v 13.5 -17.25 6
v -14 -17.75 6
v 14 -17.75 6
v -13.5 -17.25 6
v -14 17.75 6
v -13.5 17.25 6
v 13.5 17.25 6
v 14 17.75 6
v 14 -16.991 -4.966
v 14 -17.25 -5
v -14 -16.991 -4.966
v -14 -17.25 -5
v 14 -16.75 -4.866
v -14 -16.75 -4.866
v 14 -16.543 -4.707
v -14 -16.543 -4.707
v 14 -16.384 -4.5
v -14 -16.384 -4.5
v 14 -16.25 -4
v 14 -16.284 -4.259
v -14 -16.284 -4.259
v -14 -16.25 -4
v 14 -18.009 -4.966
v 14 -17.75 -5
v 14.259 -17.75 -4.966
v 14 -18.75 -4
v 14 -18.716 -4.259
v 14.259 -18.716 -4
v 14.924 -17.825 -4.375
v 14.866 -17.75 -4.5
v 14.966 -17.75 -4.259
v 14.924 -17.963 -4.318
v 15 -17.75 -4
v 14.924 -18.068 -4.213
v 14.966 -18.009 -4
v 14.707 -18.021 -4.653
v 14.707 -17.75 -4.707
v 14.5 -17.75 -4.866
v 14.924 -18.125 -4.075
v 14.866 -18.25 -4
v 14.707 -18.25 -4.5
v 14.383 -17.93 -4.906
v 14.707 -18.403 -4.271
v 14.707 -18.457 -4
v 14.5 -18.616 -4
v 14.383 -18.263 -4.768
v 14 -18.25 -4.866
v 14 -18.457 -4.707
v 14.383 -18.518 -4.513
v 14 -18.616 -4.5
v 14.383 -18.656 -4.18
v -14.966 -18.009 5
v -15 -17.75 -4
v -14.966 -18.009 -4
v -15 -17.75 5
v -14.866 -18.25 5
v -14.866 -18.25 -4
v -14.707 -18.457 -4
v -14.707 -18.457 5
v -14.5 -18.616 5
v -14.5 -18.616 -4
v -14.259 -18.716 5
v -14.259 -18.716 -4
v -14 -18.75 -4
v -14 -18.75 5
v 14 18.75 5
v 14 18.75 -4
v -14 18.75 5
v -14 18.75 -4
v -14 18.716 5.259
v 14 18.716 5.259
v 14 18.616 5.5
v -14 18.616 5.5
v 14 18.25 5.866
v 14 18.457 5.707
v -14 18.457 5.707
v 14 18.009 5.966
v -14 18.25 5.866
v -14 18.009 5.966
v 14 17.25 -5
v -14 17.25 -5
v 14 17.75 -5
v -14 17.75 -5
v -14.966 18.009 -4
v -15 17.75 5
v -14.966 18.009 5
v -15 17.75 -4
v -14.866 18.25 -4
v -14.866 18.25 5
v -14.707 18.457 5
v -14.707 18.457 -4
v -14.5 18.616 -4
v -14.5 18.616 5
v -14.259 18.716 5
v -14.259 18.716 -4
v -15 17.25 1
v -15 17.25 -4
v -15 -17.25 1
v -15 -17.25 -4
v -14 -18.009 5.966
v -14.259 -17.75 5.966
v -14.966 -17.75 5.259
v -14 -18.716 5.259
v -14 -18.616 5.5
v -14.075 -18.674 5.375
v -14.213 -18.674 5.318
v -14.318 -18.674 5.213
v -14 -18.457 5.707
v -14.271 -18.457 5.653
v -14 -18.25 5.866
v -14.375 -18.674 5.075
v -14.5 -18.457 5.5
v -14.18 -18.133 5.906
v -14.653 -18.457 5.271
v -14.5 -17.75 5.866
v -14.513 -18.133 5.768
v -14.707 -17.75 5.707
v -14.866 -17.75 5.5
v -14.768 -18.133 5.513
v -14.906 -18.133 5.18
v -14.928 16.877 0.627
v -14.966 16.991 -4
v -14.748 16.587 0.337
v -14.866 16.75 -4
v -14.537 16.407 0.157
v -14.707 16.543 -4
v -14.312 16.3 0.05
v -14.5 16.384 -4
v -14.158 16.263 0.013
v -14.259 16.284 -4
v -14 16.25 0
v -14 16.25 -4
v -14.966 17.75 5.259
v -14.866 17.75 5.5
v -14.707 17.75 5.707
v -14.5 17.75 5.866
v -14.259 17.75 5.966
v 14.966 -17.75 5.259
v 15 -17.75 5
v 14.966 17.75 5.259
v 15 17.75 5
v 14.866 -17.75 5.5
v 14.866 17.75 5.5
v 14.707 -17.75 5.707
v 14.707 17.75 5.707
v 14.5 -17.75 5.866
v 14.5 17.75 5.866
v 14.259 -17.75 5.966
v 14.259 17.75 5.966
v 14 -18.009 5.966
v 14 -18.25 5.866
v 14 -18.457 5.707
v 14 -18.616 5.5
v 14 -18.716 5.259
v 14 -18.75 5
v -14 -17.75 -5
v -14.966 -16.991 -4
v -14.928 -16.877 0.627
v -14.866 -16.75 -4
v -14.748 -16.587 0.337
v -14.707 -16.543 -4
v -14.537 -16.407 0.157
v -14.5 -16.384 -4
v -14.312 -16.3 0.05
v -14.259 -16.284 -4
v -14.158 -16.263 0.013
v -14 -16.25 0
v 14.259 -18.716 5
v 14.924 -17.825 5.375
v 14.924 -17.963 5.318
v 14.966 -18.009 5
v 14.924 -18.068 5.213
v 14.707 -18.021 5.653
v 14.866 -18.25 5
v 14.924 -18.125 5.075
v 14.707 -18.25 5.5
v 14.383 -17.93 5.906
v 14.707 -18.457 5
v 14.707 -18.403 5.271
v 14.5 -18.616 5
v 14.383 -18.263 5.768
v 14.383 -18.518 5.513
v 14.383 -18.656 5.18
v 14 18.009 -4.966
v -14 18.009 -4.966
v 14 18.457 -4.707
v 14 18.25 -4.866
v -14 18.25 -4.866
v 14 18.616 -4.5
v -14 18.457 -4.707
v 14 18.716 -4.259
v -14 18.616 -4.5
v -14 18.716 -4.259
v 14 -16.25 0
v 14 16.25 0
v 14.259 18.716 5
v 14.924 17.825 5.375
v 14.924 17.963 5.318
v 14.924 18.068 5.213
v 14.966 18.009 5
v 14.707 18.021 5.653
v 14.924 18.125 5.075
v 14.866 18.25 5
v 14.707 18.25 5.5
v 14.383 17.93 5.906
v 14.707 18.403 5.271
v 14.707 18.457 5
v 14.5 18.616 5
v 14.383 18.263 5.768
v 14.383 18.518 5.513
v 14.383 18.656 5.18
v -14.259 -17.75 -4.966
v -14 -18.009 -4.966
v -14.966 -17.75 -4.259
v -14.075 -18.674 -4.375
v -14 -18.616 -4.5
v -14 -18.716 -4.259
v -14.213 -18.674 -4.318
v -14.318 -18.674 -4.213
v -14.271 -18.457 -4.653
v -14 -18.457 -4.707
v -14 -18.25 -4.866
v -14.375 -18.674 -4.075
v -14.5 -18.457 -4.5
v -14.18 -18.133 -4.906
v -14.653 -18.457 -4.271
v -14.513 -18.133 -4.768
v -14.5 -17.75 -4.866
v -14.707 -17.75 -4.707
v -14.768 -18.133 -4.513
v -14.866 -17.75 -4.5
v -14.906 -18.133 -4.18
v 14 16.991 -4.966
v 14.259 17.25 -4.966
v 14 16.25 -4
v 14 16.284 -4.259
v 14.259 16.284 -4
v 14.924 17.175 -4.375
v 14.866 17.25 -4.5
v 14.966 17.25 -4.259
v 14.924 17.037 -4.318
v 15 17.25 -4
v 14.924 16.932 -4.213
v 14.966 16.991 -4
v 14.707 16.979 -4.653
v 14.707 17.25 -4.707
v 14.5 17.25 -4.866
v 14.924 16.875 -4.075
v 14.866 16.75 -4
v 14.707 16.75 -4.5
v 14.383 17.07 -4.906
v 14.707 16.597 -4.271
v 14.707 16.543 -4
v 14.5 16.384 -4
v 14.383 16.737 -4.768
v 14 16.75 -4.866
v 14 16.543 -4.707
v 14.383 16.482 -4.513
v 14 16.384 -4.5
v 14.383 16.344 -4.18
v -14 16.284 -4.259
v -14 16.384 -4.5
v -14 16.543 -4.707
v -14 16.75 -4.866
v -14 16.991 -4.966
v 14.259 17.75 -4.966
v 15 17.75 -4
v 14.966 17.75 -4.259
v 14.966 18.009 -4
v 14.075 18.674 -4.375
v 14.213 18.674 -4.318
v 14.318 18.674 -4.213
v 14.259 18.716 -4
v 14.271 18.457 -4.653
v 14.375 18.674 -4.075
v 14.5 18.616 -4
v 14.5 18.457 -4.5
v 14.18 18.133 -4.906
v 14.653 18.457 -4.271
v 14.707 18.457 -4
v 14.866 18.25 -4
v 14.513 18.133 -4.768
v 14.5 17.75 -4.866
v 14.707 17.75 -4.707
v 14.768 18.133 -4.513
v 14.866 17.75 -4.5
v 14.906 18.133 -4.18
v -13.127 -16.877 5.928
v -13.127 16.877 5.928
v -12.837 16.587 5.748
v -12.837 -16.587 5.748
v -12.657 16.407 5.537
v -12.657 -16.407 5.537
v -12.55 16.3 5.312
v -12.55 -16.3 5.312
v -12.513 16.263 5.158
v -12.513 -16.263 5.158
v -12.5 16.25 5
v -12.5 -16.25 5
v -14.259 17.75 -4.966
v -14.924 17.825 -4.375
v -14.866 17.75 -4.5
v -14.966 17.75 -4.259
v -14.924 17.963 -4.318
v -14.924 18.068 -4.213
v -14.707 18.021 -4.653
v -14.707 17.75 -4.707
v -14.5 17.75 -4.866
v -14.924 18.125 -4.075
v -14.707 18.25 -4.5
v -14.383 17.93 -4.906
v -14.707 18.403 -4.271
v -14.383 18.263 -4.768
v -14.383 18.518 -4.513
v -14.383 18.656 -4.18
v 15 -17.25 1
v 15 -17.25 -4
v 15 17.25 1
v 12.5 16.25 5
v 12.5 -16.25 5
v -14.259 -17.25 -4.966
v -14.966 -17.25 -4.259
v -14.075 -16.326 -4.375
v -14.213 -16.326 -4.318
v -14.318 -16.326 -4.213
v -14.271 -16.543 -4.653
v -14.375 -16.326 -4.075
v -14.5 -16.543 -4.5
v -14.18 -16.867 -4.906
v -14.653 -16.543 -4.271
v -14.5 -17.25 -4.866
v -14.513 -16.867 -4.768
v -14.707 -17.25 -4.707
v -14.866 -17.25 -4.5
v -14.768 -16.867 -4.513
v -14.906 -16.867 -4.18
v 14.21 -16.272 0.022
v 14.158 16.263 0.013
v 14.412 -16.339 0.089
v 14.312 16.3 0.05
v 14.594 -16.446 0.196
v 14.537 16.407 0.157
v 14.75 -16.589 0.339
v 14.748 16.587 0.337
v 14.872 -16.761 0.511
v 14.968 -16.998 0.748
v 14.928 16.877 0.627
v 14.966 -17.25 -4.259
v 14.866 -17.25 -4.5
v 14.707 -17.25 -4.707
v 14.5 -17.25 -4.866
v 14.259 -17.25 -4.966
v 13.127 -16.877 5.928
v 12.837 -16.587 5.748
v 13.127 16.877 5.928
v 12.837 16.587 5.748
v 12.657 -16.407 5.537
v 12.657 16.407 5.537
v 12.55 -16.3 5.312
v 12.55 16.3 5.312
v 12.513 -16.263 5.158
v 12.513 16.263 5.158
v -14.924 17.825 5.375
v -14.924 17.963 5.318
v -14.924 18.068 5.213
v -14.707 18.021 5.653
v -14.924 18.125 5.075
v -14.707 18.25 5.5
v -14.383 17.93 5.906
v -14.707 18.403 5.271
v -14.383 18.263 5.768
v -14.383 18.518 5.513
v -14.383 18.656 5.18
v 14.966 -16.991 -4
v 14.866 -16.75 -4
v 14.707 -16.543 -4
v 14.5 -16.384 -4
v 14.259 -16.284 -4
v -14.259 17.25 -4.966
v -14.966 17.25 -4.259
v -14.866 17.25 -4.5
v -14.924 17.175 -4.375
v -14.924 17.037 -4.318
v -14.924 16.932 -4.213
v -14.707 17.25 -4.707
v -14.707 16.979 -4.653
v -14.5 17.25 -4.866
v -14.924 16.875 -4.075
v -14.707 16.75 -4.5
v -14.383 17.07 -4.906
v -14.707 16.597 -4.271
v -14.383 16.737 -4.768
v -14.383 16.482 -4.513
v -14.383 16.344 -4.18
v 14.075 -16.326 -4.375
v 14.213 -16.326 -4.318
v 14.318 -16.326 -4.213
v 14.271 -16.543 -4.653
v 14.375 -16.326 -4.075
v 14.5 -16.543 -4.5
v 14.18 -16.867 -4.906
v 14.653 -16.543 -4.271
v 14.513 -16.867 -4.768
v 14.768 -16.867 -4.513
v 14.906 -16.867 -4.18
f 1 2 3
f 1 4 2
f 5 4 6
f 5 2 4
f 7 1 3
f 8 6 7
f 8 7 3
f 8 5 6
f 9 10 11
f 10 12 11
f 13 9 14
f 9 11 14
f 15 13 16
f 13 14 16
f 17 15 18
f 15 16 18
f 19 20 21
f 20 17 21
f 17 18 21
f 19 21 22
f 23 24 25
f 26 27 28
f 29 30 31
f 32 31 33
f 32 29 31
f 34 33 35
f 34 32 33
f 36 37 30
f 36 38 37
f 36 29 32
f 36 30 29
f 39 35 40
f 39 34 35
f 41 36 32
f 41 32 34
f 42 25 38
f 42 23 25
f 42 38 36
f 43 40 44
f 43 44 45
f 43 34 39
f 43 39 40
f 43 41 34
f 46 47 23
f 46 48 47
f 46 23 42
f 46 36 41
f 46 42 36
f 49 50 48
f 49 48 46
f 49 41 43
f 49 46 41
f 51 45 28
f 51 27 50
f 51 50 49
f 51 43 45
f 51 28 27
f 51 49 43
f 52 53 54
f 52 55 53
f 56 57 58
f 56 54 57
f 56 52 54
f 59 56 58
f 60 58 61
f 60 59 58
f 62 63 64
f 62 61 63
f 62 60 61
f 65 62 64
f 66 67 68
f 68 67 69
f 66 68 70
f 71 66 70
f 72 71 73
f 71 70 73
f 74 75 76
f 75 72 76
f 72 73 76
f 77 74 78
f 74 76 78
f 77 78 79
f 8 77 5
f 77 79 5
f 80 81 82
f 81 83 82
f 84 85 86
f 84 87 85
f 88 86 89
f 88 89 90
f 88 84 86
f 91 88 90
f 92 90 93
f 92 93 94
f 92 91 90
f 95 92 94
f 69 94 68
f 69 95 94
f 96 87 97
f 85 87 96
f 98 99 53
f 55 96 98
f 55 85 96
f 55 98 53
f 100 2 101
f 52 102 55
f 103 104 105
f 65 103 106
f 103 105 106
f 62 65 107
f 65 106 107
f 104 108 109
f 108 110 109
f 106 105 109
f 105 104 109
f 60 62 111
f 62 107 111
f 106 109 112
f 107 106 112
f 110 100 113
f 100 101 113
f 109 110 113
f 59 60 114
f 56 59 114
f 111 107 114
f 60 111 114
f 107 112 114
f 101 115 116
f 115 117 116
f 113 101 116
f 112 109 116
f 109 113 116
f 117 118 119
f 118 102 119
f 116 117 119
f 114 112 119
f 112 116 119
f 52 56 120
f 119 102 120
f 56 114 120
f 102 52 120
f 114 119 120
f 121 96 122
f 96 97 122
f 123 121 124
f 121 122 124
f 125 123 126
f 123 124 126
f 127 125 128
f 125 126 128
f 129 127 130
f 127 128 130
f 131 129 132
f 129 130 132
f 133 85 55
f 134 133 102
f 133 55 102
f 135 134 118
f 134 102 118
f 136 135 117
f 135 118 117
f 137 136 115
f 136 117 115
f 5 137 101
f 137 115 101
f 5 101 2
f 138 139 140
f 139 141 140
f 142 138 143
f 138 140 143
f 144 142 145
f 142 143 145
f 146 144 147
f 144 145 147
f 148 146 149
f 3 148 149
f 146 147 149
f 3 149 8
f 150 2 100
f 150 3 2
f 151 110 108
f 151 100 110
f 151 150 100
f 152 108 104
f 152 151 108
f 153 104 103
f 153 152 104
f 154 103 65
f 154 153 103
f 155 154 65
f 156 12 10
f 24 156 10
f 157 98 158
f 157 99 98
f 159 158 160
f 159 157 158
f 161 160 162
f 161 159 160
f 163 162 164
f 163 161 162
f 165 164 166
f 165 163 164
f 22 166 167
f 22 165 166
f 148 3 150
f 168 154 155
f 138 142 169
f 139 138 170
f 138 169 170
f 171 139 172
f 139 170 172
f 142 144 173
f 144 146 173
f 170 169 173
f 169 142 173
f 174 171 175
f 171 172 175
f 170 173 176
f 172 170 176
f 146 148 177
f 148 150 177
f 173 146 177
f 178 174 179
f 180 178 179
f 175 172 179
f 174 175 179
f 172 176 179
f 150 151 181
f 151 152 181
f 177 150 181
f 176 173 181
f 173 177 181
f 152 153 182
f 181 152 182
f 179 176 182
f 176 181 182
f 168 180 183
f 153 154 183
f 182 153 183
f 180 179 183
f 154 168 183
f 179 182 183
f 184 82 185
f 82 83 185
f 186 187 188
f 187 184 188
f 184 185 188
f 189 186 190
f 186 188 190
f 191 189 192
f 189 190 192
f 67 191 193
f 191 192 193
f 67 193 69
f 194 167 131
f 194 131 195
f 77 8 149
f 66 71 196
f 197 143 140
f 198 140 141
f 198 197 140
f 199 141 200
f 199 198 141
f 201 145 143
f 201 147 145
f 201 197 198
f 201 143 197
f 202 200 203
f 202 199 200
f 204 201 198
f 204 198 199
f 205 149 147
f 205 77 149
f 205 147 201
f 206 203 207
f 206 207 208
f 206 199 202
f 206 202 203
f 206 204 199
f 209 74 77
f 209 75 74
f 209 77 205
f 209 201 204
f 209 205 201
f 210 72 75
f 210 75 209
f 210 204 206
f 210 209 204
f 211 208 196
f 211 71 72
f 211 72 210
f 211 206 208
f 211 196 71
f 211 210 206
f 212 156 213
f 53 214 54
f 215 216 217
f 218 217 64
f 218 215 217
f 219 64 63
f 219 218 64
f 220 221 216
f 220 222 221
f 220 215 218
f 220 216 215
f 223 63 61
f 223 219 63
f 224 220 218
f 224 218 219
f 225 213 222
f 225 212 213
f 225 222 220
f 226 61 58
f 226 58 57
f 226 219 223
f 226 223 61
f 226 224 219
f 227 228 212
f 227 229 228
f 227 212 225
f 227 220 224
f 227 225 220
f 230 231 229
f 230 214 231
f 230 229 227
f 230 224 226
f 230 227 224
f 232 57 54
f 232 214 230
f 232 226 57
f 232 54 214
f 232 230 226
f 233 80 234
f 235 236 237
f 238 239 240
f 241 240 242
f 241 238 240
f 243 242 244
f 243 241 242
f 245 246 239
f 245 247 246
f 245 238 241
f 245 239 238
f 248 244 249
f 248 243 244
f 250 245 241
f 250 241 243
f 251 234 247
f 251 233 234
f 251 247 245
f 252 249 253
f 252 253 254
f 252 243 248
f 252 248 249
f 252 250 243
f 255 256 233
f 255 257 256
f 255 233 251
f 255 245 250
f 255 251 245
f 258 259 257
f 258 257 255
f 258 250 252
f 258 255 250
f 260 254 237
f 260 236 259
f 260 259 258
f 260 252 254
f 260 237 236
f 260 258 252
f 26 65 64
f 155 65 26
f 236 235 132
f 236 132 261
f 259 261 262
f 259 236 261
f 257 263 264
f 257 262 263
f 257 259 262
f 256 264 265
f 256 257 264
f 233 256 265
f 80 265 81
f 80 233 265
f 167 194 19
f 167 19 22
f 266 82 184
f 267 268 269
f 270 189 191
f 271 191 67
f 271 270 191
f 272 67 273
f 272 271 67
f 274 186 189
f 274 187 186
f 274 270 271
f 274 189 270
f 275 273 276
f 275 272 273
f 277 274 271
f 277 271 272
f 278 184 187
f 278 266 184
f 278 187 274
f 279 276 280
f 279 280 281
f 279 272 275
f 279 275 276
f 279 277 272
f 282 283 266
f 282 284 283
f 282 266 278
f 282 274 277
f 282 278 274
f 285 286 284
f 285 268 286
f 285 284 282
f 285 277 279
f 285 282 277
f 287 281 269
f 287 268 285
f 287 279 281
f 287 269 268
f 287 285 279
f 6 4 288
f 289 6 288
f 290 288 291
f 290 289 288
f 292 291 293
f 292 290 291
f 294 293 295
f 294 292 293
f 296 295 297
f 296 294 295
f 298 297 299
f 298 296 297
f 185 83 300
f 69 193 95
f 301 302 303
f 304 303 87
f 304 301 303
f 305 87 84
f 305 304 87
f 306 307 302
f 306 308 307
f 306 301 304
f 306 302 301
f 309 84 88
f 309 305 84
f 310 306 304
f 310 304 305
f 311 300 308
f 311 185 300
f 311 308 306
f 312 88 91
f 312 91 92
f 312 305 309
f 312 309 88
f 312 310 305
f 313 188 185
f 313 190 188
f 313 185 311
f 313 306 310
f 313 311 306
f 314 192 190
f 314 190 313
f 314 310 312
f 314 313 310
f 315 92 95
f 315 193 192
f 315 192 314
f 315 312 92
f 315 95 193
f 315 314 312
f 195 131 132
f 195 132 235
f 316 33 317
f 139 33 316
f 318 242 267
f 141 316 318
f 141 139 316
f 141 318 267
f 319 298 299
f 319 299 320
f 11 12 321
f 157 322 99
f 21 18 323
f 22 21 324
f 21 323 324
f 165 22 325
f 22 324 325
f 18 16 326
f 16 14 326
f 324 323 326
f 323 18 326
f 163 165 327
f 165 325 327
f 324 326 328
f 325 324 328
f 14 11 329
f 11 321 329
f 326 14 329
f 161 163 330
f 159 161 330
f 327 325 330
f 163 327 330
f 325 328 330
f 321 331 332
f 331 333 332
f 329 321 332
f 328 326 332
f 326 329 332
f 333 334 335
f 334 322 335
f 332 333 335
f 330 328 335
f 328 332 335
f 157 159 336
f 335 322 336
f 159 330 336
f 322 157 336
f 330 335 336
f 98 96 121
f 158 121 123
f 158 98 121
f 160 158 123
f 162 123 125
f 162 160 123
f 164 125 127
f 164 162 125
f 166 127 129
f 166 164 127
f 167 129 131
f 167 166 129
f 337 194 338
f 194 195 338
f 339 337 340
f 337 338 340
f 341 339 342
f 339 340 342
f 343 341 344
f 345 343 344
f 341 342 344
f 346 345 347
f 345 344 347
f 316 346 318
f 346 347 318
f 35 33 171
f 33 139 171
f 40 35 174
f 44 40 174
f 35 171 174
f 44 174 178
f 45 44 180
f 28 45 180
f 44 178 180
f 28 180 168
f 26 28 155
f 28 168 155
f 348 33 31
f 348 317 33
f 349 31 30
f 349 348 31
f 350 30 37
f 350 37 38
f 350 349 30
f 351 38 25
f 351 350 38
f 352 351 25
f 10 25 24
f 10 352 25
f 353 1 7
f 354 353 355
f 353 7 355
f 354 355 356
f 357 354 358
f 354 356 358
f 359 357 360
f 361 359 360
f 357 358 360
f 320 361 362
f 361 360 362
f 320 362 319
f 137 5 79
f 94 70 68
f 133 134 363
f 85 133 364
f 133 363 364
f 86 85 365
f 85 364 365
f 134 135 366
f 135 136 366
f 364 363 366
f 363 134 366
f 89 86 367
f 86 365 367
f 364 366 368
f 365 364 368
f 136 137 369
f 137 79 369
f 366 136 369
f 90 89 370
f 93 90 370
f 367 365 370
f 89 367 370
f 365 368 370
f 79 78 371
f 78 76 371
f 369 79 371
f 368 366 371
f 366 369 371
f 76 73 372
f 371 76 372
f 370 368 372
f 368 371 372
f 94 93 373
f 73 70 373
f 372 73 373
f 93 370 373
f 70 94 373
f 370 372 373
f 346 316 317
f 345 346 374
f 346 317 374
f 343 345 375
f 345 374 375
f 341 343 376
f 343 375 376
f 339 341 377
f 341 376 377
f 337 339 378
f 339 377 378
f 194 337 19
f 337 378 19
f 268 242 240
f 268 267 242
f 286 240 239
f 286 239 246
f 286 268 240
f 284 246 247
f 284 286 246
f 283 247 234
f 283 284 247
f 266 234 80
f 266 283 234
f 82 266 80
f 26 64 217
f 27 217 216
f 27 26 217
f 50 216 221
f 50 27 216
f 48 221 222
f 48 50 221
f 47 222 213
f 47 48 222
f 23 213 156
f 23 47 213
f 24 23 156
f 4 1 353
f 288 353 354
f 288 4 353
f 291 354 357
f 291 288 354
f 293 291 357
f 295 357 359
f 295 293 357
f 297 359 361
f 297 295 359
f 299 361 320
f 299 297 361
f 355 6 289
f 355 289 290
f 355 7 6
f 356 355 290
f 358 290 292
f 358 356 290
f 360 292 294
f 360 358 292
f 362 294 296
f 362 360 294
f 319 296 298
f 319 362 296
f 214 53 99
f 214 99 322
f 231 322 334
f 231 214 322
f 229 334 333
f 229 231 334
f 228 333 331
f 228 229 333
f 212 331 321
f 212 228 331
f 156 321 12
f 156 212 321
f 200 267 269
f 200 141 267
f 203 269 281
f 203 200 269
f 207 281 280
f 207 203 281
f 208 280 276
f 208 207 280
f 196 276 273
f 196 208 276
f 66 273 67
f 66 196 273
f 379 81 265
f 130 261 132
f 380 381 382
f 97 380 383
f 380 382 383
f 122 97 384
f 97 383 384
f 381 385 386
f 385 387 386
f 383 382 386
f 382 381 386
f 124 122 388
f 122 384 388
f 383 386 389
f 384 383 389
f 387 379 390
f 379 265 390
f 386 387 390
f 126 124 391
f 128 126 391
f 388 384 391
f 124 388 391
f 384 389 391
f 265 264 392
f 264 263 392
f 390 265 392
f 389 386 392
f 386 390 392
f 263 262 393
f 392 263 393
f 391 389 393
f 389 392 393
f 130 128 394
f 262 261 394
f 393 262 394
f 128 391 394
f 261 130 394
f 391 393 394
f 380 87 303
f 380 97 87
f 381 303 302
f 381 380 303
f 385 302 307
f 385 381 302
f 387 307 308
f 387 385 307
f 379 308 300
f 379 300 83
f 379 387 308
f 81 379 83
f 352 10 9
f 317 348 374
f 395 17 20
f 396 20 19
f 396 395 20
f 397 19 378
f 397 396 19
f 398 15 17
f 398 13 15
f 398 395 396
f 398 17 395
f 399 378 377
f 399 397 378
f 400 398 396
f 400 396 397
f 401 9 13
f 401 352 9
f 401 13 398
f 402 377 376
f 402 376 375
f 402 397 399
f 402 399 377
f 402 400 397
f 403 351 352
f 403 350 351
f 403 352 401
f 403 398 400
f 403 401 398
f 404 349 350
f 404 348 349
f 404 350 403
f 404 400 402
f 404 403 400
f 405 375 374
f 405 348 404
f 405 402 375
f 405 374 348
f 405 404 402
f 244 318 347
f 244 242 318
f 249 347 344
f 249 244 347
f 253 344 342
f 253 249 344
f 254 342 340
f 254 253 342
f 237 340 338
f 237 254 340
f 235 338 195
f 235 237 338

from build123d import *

# Parameters (mm, degrees)
F0_W     = 25
F0_H     = 32.5
F0_W_2   = 2.5
F1_DEPTH = 5
F2_DEPTH = 6
F3_DEPTH = 5
F4_R     = 0.99999


# Not quite as in the source:
# - a fillet or chamfer is up to 0.001 mm smaller than in the source, because OpenCascade refuses the exact size


with BuildPart() as f1:
    # F0 (on Top) → F1 (new body)
    with BuildSketch(Plane.XY):
        Rectangle(F0_W, F0_H)
        Polygon((-15, 16.25), (-12.5, 16.25), (12.5, 16.25), (15, 16.25), (15, 18.75), (-15, 18.75), align=None)
        with Locations((-13.75, 0)):
            Rectangle(F0_W_2, F0_H)
        Polygon((12.5, -16.25), (-12.5, -16.25), (-15, -16.25), (-15, -18.75), (15, -18.75), (15, -16.25), align=None)
        with Locations((13.75, 0)):
            Rectangle(F0_W_2, F0_H)
    extrude(amount=F1_DEPTH)

    # F0 (on Top) → F2 (join)
    with BuildSketch(Plane.XY):
        Polygon((-15, 16.25), (-12.5, 16.25), (12.5, 16.25), (15, 16.25), (15, 18.75), (-15, 18.75), align=None)
        with Locations((-13.75, 0)):
            Rectangle(F0_W_2, F0_H)
        Polygon((12.5, -16.25), (-12.5, -16.25), (-15, -16.25), (-15, -18.75), (15, -18.75), (15, -16.25), align=None)
        with Locations((13.75, 0)):
            Rectangle(F0_W_2, F0_H)
    extrude(amount=F2_DEPTH)

    # F0 (on Top) → F3 (join)
    with BuildSketch(Plane.XY):
        Polygon((12.5, -16.25), (-12.5, -16.25), (-15, -16.25), (-15, -18.75), (15, -18.75), (15, -16.25), align=None)
        Polygon((-15, 16.25), (-12.5, 16.25), (12.5, 16.25), (15, 16.25), (15, 18.75), (-15, 18.75), align=None)
    extrude(amount=-F3_DEPTH)

    # F4 (radius 1 in the source; OpenCascade refuses exactly that, so slightly less here)
    f4_edges = [f1.edges().sort_by_distance(p)[0] for p in [
        (0, 16.25, -5),
        (15, 17.5, -5),
        (0, 18.75, -5),
        (-15, 17.5, -5),
        (-15, -17.5, -5),
        (0, -18.75, -5),
        (15, -17.5, -5),
        (0, -16.25, -5),
        (0, 16.25, 6),
        (12.5, 0, 6),
        (0, -16.25, 6),
        (-12.5, 0, 6),
        (0, 18.75, 6),
        (-15, 0, 6),
        (0, -18.75, 6),
        (15, 0, 6),
        (-15, -18.75, 0.5),
        (-15, -16.25, -2.5),
        (-15, 0, 0),
        (-15, 16.25, -2.5),
        (-15, 18.75, 0.5),
        (15, 18.75, 0.5),
        (15, -18.75, 0.5),
        (15, 16.25, -2.5),
        (15, 0, 0),
        (15, -16.25, -2.5),
    ]]
    fillet(f4_edges, radius=F4_R)


solid = f1.part
